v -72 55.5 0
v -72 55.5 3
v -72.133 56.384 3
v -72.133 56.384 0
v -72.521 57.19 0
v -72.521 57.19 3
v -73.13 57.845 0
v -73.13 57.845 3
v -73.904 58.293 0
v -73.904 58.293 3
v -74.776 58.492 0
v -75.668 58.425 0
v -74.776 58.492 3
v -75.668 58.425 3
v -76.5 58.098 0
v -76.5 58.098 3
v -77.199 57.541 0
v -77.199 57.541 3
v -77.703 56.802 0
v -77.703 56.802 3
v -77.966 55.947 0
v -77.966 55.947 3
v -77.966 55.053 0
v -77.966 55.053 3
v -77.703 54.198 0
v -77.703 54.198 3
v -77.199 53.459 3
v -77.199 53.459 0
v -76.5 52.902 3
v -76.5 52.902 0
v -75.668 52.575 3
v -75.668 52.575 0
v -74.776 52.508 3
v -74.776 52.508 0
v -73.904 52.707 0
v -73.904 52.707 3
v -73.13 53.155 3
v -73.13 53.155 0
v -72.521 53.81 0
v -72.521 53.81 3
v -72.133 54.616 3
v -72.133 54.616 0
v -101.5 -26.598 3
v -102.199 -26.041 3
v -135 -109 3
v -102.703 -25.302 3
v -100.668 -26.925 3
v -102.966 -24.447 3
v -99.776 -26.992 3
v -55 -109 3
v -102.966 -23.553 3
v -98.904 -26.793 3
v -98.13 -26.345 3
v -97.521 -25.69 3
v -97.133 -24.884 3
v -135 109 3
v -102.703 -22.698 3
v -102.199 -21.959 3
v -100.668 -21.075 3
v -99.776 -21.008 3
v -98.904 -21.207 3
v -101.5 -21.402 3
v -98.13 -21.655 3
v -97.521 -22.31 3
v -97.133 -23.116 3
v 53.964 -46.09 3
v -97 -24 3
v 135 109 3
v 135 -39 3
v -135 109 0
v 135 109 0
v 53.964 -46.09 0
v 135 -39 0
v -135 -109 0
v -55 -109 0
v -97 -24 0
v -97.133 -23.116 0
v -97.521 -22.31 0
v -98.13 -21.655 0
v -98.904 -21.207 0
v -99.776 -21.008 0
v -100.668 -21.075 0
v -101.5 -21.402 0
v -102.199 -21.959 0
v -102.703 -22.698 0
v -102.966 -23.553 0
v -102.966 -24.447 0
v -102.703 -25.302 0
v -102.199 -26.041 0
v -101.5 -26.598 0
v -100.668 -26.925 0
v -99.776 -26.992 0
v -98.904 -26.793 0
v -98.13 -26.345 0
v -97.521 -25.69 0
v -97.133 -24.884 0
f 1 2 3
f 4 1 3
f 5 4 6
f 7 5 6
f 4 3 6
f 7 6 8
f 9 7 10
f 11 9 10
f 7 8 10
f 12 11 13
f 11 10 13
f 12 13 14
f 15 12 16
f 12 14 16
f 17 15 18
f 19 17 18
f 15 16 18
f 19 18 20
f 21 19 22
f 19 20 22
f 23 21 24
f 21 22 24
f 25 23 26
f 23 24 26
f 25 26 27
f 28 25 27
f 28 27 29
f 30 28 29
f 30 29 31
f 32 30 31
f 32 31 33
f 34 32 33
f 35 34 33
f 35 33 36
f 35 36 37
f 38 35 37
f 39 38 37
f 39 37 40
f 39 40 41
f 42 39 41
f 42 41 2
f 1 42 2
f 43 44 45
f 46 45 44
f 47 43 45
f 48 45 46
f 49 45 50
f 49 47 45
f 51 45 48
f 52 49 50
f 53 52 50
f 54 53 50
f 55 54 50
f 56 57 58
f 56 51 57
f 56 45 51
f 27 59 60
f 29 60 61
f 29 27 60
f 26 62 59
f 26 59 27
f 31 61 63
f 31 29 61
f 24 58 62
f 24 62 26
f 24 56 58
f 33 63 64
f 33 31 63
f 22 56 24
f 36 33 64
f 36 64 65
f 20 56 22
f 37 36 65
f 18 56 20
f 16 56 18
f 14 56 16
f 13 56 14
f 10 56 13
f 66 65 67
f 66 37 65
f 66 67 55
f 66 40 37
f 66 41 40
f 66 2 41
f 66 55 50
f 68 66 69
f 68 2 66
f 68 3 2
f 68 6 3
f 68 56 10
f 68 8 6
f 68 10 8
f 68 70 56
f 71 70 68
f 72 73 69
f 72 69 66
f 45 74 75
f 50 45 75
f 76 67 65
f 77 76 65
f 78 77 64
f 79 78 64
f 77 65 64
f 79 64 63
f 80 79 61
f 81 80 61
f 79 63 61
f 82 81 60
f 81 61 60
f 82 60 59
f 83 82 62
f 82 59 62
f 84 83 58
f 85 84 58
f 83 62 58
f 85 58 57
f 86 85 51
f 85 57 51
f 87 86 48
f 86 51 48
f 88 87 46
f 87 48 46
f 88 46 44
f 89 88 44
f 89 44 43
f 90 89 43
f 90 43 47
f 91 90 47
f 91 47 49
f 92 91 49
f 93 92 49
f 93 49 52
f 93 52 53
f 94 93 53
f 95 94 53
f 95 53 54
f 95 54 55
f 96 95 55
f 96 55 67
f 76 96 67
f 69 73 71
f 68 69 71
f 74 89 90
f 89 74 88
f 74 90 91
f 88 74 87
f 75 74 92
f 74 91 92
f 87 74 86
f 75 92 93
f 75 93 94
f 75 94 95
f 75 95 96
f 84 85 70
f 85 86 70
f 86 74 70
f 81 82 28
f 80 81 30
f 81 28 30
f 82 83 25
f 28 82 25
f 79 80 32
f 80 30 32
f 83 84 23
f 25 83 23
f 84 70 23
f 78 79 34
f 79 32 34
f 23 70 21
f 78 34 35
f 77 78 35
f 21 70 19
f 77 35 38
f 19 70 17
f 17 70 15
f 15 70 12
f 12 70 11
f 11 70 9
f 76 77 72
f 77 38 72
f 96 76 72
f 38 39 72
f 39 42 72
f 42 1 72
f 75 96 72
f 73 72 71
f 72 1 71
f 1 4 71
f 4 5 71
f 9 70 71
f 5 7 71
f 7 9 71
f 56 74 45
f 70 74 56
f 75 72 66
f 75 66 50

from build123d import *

# Parameters (mm, degrees)
ESQUISSE1_W                   = 270
ESQUISSE1_H                   = 218
BOSS_EXTRU_1_DEPTH            = 3
ESQUISSE3_R                   = 3
ENL_V_MAT_EXTRU_1_DEPTH       = 10
ESQUISSE4_R                   = 3
ENL_V_MAT_EXTRU_2_DEPTH       = 10
ENL_V_MAT_EXTRU_11_DEPTH      = 174.536739626
ENL_V_MAT_EXTRU_11_DEPTH_BACK = 174.536739626


with BuildPart() as part:
    # Esquisse1 → Boss.-Extru.1 (new body)
    with BuildSketch(Plane.XY):
        Rectangle(ESQUISSE1_W, ESQUISSE1_H)
    extrude(amount=BOSS_EXTRU_1_DEPTH)

    # Esquisse3 → Enlèv. mat.-Extru.1 (cut)
    with BuildSketch(Plane.XY.offset(3)):
        with Locations((-100, -24)):
            Circle(ESQUISSE3_R)
    extrude(amount=-ENL_V_MAT_EXTRU_1_DEPTH, mode=Mode.SUBTRACT)

    # Esquisse4 → Enlèv. mat.-Extru.2 (cut)
    with BuildSketch(Plane.XY.offset(3)):
        with Locations((-75, 55.5)):
            Circle(ESQUISSE4_R)
    extrude(amount=-ENL_V_MAT_EXTRU_2_DEPTH, mode=Mode.SUBTRACT)

    # Esquisse5 → Enlèv. mat.-Extru.11 (cut, two sides: drawn at the far end of the back side and taken through both)
    with BuildSketch(Plane.XY.offset(3).offset(-ENL_V_MAT_EXTRU_11_DEPTH_BACK)):
        Polygon((135, -39), (53.963742643, -46.089753853), (-55, -109), (135, -109), align=None)
    extrude(amount=ENL_V_MAT_EXTRU_11_DEPTH + ENL_V_MAT_EXTRU_11_DEPTH_BACK, mode=Mode.SUBTRACT)


solid = part.part
